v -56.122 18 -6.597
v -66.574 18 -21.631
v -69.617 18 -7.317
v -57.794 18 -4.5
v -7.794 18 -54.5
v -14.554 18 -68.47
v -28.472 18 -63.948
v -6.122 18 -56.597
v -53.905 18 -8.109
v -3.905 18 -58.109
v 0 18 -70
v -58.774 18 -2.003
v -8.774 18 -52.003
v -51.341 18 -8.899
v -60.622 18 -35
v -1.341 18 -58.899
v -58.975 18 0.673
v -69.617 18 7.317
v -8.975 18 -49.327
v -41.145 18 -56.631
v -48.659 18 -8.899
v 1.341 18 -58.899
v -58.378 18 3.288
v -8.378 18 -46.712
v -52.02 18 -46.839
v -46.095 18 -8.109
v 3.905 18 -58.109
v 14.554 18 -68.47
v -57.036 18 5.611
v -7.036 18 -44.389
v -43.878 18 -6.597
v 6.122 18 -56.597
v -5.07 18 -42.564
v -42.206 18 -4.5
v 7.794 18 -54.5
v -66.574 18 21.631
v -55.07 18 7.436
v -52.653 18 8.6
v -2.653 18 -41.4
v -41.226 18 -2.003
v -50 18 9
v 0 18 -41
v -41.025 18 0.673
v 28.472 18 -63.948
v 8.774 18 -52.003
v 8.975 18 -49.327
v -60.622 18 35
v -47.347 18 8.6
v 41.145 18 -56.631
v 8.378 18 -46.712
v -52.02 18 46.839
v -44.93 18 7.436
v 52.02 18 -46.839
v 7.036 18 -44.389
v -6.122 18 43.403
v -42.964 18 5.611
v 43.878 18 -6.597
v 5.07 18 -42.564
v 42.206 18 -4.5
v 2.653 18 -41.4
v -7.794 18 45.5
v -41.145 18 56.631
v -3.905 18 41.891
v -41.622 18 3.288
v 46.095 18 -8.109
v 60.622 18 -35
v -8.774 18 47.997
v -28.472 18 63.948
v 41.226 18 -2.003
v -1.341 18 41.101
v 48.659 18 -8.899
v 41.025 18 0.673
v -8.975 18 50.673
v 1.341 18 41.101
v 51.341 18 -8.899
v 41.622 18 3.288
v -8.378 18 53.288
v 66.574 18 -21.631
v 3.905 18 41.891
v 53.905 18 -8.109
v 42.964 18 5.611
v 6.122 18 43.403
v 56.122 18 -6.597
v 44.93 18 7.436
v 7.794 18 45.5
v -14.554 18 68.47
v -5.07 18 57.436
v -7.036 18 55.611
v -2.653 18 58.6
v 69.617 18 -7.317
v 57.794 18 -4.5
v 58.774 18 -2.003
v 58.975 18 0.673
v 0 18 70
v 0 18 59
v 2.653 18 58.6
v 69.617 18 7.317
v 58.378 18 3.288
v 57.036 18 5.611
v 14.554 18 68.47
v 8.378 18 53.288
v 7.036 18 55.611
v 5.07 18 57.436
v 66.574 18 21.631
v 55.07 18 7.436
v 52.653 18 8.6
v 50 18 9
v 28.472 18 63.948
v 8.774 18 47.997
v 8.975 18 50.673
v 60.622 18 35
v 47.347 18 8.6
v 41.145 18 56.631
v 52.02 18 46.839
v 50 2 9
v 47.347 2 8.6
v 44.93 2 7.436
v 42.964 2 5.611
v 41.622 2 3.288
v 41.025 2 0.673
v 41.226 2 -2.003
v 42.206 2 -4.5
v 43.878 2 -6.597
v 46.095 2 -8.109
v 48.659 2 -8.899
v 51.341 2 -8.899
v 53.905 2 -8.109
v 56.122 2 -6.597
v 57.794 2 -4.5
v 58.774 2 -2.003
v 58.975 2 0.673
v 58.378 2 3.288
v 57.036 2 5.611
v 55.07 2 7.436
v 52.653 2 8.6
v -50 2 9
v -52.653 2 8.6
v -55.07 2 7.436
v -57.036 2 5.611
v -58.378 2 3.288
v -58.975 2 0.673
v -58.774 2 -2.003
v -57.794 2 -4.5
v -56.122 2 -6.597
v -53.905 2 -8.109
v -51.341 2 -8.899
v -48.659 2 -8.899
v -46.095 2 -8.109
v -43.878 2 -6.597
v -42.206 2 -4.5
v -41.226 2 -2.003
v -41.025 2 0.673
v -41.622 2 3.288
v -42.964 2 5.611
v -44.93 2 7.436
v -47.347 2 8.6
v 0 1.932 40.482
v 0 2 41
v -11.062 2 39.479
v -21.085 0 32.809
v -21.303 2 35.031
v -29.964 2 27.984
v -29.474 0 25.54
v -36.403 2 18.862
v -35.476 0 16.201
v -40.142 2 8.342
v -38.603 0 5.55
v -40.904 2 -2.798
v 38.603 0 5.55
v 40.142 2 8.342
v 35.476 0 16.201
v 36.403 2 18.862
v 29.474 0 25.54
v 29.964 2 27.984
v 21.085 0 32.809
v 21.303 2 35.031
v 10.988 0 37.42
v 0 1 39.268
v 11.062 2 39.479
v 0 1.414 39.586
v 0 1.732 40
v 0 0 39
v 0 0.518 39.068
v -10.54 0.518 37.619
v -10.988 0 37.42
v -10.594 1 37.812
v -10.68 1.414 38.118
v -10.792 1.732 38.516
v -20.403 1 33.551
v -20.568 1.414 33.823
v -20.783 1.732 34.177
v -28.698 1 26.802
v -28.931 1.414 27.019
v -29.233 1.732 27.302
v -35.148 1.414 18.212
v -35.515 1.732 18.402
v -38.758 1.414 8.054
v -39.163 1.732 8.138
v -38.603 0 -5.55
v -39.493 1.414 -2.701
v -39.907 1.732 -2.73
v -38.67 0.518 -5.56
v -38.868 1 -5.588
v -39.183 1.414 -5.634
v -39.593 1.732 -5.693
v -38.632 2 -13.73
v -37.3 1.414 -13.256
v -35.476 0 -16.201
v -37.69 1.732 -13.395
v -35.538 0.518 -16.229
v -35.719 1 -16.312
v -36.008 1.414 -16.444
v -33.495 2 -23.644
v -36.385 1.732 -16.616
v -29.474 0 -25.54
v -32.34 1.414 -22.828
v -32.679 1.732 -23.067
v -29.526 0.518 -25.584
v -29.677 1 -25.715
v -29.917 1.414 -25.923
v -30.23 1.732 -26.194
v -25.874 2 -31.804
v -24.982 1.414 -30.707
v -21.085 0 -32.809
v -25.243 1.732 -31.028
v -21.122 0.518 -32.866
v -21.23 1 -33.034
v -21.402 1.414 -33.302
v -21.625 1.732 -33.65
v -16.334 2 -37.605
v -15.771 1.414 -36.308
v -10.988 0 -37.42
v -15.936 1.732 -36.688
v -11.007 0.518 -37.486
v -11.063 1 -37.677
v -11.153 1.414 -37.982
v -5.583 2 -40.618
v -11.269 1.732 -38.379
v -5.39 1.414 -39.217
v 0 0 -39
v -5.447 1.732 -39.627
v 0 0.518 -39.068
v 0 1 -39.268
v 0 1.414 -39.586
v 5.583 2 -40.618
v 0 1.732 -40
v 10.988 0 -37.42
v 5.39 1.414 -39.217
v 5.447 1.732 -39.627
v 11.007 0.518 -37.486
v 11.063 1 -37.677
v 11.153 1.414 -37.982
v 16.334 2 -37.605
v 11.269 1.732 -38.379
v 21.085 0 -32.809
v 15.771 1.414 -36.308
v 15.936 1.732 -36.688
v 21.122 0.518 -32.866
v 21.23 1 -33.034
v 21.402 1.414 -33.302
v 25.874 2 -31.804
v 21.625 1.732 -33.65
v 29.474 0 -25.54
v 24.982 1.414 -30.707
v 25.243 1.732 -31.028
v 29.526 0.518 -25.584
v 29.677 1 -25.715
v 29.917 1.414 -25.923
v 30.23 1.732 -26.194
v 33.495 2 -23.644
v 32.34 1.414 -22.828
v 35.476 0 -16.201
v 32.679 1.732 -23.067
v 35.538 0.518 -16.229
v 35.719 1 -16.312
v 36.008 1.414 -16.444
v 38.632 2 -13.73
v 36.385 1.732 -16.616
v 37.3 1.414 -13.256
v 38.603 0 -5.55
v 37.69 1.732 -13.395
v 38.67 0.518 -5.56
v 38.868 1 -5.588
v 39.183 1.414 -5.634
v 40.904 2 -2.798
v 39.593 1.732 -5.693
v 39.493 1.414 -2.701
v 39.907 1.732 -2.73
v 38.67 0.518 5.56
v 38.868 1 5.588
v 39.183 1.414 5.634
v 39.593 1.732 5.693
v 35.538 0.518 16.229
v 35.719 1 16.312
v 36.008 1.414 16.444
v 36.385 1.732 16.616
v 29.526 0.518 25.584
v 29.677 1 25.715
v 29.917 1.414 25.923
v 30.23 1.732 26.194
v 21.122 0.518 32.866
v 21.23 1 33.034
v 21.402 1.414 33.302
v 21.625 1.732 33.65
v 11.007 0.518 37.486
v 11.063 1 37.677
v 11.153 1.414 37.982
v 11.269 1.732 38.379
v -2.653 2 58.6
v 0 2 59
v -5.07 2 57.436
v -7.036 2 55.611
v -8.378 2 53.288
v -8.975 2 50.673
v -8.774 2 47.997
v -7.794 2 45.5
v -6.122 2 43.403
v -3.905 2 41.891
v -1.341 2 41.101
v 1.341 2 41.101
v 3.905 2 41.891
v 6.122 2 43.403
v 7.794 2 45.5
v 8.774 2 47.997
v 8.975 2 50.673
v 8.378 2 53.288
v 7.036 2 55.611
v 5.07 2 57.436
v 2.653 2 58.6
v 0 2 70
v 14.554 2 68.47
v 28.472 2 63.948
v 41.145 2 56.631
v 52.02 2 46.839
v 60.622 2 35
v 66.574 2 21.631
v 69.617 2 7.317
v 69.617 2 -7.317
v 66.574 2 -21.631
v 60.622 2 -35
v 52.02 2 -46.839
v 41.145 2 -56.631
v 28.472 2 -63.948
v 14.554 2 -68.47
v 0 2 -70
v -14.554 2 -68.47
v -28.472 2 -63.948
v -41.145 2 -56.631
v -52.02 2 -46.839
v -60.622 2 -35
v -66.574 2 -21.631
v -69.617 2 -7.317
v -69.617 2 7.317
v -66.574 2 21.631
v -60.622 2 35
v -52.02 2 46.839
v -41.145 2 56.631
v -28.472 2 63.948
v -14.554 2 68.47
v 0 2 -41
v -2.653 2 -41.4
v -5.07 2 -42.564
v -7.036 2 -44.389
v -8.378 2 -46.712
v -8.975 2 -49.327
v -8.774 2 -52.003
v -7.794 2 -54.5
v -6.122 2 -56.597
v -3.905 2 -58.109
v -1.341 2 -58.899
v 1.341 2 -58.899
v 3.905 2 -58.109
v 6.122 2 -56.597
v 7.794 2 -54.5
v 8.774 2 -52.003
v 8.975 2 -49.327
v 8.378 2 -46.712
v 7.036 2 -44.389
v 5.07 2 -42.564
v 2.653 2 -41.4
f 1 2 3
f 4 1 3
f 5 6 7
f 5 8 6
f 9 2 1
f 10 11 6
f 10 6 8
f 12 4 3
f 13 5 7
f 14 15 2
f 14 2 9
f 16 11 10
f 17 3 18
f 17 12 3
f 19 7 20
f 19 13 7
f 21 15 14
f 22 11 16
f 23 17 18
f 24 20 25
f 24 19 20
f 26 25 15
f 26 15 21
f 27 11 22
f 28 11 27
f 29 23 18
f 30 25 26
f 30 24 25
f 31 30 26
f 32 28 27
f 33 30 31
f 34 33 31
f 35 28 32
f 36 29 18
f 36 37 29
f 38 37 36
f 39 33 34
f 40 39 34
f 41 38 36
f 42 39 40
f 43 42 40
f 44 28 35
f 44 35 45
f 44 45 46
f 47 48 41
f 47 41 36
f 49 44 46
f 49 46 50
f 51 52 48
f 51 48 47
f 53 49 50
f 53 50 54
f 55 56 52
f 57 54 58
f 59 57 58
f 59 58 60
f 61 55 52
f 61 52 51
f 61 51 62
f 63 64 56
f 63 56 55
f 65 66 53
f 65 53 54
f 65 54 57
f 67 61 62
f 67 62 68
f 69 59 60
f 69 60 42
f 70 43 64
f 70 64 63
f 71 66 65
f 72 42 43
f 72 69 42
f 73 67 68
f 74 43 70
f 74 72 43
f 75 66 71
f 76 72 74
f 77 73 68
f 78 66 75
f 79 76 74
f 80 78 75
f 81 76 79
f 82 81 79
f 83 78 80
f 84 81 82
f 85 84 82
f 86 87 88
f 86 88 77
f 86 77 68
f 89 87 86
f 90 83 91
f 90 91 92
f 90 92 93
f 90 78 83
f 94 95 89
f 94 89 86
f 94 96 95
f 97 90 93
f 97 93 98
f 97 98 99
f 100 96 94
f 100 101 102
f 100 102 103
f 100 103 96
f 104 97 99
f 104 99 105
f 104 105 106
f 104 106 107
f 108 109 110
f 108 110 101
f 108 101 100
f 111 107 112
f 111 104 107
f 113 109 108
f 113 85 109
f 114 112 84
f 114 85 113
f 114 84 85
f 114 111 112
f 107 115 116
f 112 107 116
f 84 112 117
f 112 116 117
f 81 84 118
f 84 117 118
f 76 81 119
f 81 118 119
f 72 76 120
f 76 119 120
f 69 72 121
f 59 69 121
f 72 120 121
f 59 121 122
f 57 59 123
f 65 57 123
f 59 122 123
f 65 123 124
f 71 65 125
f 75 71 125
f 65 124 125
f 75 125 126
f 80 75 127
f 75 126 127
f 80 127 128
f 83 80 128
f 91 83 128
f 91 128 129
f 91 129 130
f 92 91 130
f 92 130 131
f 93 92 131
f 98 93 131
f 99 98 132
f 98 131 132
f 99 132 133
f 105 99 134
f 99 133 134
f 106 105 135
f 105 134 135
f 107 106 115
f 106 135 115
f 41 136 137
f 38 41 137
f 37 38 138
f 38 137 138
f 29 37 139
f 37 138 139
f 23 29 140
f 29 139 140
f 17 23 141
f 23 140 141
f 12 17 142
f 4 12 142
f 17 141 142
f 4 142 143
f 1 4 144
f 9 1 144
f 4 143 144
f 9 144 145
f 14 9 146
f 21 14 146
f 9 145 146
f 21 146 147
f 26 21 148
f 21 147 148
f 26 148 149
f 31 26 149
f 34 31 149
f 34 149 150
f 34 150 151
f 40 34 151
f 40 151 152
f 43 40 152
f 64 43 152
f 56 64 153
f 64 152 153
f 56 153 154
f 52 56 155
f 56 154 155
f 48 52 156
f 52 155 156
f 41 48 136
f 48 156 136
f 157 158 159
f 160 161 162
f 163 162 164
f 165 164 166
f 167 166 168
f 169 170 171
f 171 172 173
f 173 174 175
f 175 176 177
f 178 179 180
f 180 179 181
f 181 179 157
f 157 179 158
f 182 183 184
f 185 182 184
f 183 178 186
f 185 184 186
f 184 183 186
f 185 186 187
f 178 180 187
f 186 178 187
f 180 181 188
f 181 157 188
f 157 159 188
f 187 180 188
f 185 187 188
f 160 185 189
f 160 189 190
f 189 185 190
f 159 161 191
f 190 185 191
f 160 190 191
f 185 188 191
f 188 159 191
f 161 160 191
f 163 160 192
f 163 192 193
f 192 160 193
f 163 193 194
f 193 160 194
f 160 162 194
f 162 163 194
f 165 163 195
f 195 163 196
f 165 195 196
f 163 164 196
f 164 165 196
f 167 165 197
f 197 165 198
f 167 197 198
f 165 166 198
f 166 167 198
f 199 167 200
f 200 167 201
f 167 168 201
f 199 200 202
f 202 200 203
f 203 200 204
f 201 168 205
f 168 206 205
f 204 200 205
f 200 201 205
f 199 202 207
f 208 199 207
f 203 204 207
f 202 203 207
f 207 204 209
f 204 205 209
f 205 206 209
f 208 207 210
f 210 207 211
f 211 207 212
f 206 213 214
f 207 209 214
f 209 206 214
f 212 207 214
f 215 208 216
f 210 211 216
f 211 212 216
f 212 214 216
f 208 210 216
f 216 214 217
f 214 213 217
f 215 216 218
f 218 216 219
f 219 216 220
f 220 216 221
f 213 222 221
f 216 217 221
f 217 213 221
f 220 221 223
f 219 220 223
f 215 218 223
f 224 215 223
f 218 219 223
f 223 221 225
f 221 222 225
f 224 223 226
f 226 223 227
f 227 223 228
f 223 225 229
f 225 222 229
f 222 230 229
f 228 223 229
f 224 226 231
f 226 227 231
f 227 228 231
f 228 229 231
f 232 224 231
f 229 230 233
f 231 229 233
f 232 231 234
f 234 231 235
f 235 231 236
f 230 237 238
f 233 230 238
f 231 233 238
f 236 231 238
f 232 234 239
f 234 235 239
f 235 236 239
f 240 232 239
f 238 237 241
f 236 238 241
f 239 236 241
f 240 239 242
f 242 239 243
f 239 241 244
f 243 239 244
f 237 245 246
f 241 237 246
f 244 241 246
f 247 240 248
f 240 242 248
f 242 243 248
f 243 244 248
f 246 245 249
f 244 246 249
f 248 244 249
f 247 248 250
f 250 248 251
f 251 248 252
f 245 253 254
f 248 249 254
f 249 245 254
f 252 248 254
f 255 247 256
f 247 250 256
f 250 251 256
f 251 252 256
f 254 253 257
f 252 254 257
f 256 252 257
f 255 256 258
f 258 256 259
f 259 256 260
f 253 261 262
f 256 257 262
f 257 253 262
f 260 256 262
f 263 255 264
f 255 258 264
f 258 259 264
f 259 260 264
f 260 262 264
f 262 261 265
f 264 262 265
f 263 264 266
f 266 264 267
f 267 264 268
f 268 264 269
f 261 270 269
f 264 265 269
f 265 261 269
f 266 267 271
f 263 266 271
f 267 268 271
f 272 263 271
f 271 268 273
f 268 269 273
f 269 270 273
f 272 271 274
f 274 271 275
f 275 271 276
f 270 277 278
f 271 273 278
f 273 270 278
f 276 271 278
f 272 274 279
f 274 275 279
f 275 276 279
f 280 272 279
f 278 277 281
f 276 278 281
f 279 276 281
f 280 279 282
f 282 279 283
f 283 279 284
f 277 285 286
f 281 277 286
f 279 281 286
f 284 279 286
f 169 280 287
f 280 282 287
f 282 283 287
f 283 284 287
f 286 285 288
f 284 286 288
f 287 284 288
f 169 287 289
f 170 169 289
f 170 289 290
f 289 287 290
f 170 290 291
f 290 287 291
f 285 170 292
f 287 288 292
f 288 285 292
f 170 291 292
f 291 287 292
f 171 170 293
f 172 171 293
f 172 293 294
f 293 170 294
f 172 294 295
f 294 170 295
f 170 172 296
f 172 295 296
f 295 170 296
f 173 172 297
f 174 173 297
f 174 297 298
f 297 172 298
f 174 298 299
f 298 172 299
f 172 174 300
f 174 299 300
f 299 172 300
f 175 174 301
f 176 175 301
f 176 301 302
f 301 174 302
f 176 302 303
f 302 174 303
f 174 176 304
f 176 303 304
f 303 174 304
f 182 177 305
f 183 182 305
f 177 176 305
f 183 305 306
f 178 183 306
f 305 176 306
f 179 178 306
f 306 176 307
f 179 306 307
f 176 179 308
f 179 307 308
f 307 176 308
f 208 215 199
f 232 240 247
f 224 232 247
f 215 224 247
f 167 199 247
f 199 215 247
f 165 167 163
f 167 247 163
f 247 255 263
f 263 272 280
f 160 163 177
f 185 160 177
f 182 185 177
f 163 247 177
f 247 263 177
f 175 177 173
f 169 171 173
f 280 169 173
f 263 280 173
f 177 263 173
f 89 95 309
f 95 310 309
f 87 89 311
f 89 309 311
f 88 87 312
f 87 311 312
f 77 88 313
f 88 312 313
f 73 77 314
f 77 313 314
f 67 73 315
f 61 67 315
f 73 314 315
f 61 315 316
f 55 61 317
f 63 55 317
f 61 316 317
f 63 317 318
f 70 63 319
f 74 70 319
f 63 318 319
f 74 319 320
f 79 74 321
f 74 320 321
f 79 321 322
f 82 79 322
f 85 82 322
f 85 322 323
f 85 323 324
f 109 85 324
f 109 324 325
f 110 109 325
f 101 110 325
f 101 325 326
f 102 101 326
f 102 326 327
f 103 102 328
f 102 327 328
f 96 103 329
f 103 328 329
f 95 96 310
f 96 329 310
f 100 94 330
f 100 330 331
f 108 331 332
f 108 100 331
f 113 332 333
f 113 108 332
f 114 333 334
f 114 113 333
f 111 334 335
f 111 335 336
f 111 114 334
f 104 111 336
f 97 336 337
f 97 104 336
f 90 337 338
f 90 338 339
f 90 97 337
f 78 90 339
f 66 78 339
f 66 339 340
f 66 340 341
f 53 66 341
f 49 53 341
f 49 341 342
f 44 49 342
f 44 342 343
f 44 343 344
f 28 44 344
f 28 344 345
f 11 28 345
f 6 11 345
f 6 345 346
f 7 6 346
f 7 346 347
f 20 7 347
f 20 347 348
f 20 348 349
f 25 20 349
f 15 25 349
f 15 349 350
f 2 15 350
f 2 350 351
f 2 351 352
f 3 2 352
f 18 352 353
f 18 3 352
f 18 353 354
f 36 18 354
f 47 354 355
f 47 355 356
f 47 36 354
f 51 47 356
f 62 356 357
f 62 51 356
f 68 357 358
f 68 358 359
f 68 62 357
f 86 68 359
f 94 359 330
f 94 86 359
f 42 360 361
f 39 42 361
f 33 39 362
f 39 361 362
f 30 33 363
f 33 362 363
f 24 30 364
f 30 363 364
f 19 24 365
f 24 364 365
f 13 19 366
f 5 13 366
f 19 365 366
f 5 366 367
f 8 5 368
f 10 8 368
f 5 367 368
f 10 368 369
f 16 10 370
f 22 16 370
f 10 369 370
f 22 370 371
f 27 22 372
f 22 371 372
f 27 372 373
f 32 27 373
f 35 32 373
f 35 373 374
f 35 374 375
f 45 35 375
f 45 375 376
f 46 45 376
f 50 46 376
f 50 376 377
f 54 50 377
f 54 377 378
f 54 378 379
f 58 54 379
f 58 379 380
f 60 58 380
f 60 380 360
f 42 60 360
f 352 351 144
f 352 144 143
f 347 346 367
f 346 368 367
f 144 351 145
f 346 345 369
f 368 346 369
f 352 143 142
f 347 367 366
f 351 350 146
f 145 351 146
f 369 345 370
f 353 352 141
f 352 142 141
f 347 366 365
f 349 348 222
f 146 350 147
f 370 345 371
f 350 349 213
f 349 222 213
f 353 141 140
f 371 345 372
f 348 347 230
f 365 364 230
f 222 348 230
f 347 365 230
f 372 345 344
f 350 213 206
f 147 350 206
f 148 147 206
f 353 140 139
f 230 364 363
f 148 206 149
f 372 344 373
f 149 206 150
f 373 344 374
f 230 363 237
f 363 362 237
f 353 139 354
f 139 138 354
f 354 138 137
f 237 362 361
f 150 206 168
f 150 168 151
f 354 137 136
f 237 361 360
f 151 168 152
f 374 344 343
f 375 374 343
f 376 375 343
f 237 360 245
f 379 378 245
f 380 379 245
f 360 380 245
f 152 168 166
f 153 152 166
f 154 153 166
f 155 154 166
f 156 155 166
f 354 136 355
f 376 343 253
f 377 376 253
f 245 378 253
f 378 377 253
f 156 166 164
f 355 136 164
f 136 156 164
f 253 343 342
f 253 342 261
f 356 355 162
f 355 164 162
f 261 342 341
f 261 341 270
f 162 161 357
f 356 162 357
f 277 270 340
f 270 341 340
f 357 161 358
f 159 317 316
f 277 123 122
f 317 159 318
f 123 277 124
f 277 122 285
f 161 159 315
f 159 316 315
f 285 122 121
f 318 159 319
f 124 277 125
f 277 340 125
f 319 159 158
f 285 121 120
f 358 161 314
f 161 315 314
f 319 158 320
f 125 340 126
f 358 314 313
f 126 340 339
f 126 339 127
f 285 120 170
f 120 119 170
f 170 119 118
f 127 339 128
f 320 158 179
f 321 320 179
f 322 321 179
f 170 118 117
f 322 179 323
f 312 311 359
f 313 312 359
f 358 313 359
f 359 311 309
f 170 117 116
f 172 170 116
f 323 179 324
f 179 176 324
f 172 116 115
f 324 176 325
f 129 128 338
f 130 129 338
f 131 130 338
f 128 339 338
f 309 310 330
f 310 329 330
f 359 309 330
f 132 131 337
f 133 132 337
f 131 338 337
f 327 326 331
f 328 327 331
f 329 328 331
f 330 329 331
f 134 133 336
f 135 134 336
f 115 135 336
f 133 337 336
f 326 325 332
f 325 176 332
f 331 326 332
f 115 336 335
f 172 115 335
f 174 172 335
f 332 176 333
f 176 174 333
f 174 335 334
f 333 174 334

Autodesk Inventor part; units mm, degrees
ref_plane "YZ Plane" through (0, 0, 0) normal (1, 0, 0) x (0, 1, 0)
ref_plane "XZ Plane" through (0, 0, 0) normal (0, 1, 0) x (-1, 0, 0)
ref_plane "XY Plane" through (0, 0, 0) normal (0, 0, 1) x (1, 0, 0)
sketch "Sketch1" plane through (0, 0, 0) normal (1, 0, 0) x (0, 1, 0)
  line L0 (0, 0) -> (21, 0)
  line L1 (0, 0) -> (0, 39)
  line L2 (0, 39) -> (2, 39)
  line L3 (2, 39) -> (2, 70)
  line L4 (2, 70) -> (18, 70)
  line L5 (18, 70) -> (18, 0)
  dimension "d0" = 78
  dimension "d2" = 18
  dimension "d3" = 140
  dimension "d6" = 2
revolve "Revolution1" add sketch "Sketch1" angle 360 about axis through (0, 0, 0) along (0, 1, 0)
sketch "Sketch2" plane through (0, 18, 0) normal (0, 1, 0) x (1, 0, 0)
  point P0 (0, 0)
  point P1 (-50, 0)
  point P2 (0, 50)
  point P3 (50, 0)
  point P4 (0, -50)
hole "Hole1" at (-50, 18, 0) at (0, 18, -50) at (50, 18, 0) at (0, 18, 50) direction (0, -1, 0) diameter 18 end through all
fillet "Fillet1" radius 2 1 edges at (0, 2, -39)
properties part number "vakkarima" material "Steel, Alloy"
